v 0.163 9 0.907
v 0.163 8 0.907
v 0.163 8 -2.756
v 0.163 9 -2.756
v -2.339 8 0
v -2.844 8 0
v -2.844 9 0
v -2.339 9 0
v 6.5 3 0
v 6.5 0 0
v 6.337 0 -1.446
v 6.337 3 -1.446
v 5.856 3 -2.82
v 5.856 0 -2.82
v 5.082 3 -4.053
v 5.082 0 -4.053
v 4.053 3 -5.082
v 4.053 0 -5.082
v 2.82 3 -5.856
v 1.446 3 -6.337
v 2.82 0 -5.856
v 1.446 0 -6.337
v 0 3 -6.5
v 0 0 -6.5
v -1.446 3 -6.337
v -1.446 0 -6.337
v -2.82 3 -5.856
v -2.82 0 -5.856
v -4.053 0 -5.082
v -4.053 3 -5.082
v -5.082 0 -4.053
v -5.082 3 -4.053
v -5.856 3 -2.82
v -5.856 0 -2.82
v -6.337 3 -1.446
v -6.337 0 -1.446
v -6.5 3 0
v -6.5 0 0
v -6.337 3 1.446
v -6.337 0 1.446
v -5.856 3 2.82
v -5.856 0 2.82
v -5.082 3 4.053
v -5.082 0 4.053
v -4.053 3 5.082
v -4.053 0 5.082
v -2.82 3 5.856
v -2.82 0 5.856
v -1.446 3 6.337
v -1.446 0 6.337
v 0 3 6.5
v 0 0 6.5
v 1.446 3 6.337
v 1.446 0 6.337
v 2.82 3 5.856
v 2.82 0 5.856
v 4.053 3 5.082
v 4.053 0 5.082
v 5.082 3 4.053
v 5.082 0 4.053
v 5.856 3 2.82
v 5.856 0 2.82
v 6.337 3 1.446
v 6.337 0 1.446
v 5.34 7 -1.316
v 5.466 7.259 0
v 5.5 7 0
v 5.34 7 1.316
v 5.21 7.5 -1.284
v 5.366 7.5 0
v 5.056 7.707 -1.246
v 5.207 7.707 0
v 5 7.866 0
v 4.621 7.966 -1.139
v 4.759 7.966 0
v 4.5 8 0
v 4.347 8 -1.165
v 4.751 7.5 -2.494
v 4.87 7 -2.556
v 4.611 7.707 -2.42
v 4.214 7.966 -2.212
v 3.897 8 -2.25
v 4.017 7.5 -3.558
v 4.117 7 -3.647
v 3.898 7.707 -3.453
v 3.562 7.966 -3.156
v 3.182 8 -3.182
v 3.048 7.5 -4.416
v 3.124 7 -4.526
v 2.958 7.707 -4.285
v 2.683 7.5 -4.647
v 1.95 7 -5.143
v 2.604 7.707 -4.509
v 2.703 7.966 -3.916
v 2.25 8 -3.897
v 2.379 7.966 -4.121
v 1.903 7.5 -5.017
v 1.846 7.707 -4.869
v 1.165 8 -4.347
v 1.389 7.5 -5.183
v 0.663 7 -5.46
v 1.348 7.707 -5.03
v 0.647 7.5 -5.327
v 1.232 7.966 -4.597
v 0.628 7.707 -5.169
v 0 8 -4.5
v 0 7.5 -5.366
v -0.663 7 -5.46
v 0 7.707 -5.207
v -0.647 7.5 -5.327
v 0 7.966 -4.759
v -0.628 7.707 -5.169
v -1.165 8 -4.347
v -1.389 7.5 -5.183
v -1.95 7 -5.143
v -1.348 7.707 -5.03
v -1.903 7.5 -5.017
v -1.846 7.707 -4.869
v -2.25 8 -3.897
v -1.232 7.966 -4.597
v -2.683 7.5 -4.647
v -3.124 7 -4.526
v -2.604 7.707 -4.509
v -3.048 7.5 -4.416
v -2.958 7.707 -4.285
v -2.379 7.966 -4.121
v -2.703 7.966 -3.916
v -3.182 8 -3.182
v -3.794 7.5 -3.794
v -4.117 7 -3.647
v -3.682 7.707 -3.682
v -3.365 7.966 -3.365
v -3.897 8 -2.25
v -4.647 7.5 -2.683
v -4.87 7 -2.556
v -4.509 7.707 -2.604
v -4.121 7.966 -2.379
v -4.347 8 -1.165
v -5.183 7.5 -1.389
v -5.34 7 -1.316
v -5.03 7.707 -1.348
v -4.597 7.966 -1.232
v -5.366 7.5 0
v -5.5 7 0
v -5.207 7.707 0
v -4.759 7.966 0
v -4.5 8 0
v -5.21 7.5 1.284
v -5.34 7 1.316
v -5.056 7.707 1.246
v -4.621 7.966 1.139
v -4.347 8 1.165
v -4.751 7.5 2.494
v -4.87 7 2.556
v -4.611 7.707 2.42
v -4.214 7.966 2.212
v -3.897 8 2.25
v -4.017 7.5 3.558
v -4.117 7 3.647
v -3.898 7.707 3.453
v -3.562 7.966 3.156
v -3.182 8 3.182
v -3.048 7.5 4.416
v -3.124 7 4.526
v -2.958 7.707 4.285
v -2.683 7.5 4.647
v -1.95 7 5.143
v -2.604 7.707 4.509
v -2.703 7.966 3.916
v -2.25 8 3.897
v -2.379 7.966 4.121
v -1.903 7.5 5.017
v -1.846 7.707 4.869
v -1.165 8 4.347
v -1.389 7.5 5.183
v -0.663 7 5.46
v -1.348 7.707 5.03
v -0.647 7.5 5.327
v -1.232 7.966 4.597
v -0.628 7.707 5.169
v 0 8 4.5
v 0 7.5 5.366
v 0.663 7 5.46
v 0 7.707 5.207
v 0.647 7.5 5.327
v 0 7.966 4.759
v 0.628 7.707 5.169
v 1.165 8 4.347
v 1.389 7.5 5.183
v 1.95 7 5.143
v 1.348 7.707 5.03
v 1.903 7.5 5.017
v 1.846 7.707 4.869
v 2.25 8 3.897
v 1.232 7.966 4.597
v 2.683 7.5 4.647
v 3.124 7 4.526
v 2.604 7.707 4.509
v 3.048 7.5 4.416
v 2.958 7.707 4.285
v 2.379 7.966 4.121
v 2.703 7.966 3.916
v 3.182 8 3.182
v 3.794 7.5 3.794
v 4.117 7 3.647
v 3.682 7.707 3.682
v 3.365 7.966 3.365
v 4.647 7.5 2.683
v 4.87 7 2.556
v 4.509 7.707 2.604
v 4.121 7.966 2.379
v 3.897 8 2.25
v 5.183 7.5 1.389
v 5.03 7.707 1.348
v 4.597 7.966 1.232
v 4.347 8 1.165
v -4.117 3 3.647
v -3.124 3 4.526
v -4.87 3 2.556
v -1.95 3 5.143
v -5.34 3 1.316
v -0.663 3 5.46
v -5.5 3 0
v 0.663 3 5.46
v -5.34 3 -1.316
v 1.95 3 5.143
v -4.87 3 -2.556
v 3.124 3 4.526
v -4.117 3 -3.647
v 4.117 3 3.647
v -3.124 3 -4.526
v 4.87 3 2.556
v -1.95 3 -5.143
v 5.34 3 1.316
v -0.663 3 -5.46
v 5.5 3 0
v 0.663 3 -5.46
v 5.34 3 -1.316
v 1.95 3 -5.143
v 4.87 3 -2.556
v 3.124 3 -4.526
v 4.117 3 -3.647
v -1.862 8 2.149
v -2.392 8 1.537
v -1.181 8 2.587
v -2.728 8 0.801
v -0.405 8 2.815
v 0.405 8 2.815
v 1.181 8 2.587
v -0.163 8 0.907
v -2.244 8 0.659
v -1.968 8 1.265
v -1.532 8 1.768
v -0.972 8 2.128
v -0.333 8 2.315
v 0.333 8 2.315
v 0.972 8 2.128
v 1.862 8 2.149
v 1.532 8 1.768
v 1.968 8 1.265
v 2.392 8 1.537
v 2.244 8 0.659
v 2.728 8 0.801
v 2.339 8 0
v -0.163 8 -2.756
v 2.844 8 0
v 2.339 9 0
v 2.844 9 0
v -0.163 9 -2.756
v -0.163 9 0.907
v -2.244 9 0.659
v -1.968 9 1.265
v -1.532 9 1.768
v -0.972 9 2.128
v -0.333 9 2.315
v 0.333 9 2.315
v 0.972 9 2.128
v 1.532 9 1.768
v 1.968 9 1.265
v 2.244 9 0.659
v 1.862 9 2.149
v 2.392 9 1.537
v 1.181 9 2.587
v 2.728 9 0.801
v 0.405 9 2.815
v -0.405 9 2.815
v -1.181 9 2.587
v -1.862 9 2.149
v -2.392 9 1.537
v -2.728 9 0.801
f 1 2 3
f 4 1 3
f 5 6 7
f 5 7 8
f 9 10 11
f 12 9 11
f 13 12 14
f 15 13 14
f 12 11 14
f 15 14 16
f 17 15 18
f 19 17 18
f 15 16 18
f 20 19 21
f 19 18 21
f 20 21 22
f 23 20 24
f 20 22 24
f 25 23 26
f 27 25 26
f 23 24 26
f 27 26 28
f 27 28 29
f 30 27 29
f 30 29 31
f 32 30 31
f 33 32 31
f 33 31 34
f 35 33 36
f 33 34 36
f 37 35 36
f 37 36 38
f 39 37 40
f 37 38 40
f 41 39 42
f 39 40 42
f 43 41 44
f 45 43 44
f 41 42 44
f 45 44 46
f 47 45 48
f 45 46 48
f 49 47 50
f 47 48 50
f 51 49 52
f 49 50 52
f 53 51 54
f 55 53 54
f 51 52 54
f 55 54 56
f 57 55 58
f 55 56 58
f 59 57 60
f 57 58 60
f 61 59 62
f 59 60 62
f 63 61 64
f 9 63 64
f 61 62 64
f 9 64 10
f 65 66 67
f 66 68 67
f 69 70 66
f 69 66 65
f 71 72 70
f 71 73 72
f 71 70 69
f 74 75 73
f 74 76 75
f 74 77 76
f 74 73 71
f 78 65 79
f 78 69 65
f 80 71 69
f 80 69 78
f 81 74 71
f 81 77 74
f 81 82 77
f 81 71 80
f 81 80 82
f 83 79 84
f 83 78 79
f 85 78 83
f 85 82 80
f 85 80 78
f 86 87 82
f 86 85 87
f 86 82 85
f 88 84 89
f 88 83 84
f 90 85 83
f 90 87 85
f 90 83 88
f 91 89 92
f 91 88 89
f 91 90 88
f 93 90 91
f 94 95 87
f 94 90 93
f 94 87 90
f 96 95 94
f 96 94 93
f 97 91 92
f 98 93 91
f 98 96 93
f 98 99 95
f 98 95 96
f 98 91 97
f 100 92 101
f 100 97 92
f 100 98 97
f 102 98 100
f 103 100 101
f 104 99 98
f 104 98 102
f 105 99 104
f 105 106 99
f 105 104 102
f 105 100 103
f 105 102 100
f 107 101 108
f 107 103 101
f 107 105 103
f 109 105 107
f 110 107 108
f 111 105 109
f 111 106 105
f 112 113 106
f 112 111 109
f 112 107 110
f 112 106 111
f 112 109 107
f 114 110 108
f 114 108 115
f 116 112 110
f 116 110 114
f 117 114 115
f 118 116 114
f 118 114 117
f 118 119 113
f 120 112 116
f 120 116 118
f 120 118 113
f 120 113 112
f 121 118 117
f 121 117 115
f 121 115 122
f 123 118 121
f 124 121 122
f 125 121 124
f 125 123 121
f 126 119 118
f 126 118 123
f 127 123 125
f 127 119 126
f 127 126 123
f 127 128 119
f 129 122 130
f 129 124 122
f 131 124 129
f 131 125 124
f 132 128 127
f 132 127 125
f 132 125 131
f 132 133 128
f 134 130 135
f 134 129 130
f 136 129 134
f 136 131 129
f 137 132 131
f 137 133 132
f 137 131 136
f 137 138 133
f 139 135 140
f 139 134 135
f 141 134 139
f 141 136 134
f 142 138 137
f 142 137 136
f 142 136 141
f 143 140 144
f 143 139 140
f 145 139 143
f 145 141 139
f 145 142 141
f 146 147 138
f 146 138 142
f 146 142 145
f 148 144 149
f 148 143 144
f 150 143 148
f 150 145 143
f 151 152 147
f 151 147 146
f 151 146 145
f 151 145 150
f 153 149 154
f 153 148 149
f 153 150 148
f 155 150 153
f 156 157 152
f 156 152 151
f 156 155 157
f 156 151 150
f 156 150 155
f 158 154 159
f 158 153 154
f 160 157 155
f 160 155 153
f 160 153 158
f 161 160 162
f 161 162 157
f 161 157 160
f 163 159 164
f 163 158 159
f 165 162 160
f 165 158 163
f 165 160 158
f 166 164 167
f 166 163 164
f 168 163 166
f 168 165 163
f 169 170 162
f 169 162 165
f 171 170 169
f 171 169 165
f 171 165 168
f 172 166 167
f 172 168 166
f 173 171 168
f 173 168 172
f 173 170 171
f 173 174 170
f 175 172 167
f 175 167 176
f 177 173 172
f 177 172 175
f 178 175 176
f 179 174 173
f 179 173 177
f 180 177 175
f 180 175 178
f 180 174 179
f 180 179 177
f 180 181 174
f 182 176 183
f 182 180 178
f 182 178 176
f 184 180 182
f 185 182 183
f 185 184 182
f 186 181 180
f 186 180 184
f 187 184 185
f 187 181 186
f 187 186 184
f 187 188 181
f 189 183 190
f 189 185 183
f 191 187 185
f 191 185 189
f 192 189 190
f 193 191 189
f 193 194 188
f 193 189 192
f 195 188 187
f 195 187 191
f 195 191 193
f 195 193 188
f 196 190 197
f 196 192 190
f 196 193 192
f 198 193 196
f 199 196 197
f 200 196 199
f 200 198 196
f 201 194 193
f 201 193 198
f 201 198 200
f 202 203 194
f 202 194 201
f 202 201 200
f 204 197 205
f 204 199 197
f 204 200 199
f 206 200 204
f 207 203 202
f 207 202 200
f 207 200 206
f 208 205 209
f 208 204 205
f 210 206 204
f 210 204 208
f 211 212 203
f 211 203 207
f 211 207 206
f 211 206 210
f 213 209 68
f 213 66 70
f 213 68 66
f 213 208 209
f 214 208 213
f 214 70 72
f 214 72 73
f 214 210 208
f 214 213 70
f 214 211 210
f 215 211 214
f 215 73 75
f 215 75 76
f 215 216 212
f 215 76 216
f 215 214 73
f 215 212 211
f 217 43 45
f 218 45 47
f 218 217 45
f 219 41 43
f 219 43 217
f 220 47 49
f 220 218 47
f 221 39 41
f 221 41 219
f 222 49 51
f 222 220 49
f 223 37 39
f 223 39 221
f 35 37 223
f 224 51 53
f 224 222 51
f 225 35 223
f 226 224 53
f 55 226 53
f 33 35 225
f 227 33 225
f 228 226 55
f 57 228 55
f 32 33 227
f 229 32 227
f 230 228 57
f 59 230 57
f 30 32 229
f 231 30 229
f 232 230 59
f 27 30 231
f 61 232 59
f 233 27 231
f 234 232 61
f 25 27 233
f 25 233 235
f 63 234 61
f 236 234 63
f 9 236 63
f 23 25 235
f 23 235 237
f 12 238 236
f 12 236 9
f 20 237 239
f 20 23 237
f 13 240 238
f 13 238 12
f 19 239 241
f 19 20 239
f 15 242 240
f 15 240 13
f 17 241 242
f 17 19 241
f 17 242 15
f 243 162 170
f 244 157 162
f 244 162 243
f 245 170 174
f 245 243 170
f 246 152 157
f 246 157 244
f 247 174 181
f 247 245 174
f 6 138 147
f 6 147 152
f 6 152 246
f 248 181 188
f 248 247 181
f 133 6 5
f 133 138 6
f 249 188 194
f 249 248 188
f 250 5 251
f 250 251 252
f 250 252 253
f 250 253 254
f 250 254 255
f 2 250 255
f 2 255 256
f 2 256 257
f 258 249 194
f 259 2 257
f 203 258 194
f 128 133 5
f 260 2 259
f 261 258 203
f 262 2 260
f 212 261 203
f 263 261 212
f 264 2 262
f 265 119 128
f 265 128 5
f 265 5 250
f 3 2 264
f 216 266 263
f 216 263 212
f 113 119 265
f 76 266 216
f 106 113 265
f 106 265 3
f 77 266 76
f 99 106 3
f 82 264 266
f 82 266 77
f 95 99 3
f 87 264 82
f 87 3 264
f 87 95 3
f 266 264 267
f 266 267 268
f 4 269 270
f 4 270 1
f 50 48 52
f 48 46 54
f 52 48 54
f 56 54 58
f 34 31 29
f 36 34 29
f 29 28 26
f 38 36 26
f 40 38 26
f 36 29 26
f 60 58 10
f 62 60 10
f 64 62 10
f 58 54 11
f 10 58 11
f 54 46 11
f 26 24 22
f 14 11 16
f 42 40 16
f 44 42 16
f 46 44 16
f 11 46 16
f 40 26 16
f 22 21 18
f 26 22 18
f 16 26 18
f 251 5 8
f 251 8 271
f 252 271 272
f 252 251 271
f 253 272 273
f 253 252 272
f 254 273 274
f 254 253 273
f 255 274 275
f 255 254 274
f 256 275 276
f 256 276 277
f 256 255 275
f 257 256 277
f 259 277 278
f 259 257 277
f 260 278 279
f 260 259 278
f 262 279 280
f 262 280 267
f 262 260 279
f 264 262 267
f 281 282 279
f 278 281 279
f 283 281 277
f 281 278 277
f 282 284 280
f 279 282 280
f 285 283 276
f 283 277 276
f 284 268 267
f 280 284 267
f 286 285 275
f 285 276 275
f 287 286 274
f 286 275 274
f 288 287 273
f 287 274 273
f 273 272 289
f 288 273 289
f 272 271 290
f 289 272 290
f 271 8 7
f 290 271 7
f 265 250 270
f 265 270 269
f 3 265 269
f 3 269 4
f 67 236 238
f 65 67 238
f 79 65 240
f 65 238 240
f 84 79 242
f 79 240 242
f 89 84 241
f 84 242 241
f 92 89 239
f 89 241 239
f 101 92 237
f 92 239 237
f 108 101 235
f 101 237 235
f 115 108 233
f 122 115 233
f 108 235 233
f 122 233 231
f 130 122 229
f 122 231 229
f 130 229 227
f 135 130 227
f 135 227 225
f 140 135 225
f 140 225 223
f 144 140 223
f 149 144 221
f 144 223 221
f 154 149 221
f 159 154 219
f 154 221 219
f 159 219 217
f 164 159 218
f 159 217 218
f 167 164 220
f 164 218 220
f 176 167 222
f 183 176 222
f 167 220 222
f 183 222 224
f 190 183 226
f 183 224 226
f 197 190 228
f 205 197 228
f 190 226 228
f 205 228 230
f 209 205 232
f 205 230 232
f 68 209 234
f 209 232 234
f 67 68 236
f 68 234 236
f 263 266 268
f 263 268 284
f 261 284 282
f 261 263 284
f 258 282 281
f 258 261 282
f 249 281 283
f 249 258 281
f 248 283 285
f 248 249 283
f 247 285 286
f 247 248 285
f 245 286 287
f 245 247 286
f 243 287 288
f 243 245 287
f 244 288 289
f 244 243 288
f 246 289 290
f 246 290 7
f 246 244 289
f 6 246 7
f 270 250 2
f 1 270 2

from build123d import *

# Parameters (mm, degrees)
SKETCH_1_R      = 6.5
EXTRUDE_2_DEPTH = 3
SKETCH_3_R      = 5.5
EXTRUDE_3_DEPTH = 5
FILLET_1_R      = 1
SKETCH_4_W      = 0.326388432
SKETCH_4_H      = 3.66280352
EXTRUDE_4_DEPTH = 1


with BuildPart() as part:
    # 草图1 → 凸台-拉伸2 (new body)
    with BuildSketch(Plane(origin=(0, 0, 0), x_dir=(1, 0, 0), z_dir=(0, 1, 0))):
        Circle(SKETCH_1_R)
    extrude(amount=EXTRUDE_2_DEPTH)

    # 草图3 → 凸台-拉伸3 (add)
    with BuildSketch(Plane(origin=(0, 3, 0), x_dir=(1, 0, 0), z_dir=(0, 1, 0))):
        Circle(SKETCH_3_R)
    extrude(amount=EXTRUDE_3_DEPTH)

    # 圆角1
    fillet_1_edges = [part.edges().sort_by_distance(p)[0] for p in [
        (-5.5, 8, 0),
    ]]
    fillet(fillet_1_edges, radius=FILLET_1_R)

    # 草图4 → 凸台-拉伸4 (add)
    with BuildSketch(Plane(origin=(0, 8, 0), x_dir=(1, 0, 0), z_dir=(0, 1, 0))):
        with BuildLine():
            Line((-2.843597496, 0), (-2.339117099, 0))
            ThreePointArc((-2.339117099, 0), (0, -2.339117099), (2.339117099, 0))
            Line((2.339117099, 0), (2.843597496, 0))
            ThreePointArc((2.843597496, 0), (0, -2.843597496), (-2.843597496, 0))
        make_face()
        with Locations((0, 0.924767225)):
            Rectangle(SKETCH_4_W, SKETCH_4_H)
    extrude(amount=EXTRUDE_4_DEPTH)


solid = part.part
